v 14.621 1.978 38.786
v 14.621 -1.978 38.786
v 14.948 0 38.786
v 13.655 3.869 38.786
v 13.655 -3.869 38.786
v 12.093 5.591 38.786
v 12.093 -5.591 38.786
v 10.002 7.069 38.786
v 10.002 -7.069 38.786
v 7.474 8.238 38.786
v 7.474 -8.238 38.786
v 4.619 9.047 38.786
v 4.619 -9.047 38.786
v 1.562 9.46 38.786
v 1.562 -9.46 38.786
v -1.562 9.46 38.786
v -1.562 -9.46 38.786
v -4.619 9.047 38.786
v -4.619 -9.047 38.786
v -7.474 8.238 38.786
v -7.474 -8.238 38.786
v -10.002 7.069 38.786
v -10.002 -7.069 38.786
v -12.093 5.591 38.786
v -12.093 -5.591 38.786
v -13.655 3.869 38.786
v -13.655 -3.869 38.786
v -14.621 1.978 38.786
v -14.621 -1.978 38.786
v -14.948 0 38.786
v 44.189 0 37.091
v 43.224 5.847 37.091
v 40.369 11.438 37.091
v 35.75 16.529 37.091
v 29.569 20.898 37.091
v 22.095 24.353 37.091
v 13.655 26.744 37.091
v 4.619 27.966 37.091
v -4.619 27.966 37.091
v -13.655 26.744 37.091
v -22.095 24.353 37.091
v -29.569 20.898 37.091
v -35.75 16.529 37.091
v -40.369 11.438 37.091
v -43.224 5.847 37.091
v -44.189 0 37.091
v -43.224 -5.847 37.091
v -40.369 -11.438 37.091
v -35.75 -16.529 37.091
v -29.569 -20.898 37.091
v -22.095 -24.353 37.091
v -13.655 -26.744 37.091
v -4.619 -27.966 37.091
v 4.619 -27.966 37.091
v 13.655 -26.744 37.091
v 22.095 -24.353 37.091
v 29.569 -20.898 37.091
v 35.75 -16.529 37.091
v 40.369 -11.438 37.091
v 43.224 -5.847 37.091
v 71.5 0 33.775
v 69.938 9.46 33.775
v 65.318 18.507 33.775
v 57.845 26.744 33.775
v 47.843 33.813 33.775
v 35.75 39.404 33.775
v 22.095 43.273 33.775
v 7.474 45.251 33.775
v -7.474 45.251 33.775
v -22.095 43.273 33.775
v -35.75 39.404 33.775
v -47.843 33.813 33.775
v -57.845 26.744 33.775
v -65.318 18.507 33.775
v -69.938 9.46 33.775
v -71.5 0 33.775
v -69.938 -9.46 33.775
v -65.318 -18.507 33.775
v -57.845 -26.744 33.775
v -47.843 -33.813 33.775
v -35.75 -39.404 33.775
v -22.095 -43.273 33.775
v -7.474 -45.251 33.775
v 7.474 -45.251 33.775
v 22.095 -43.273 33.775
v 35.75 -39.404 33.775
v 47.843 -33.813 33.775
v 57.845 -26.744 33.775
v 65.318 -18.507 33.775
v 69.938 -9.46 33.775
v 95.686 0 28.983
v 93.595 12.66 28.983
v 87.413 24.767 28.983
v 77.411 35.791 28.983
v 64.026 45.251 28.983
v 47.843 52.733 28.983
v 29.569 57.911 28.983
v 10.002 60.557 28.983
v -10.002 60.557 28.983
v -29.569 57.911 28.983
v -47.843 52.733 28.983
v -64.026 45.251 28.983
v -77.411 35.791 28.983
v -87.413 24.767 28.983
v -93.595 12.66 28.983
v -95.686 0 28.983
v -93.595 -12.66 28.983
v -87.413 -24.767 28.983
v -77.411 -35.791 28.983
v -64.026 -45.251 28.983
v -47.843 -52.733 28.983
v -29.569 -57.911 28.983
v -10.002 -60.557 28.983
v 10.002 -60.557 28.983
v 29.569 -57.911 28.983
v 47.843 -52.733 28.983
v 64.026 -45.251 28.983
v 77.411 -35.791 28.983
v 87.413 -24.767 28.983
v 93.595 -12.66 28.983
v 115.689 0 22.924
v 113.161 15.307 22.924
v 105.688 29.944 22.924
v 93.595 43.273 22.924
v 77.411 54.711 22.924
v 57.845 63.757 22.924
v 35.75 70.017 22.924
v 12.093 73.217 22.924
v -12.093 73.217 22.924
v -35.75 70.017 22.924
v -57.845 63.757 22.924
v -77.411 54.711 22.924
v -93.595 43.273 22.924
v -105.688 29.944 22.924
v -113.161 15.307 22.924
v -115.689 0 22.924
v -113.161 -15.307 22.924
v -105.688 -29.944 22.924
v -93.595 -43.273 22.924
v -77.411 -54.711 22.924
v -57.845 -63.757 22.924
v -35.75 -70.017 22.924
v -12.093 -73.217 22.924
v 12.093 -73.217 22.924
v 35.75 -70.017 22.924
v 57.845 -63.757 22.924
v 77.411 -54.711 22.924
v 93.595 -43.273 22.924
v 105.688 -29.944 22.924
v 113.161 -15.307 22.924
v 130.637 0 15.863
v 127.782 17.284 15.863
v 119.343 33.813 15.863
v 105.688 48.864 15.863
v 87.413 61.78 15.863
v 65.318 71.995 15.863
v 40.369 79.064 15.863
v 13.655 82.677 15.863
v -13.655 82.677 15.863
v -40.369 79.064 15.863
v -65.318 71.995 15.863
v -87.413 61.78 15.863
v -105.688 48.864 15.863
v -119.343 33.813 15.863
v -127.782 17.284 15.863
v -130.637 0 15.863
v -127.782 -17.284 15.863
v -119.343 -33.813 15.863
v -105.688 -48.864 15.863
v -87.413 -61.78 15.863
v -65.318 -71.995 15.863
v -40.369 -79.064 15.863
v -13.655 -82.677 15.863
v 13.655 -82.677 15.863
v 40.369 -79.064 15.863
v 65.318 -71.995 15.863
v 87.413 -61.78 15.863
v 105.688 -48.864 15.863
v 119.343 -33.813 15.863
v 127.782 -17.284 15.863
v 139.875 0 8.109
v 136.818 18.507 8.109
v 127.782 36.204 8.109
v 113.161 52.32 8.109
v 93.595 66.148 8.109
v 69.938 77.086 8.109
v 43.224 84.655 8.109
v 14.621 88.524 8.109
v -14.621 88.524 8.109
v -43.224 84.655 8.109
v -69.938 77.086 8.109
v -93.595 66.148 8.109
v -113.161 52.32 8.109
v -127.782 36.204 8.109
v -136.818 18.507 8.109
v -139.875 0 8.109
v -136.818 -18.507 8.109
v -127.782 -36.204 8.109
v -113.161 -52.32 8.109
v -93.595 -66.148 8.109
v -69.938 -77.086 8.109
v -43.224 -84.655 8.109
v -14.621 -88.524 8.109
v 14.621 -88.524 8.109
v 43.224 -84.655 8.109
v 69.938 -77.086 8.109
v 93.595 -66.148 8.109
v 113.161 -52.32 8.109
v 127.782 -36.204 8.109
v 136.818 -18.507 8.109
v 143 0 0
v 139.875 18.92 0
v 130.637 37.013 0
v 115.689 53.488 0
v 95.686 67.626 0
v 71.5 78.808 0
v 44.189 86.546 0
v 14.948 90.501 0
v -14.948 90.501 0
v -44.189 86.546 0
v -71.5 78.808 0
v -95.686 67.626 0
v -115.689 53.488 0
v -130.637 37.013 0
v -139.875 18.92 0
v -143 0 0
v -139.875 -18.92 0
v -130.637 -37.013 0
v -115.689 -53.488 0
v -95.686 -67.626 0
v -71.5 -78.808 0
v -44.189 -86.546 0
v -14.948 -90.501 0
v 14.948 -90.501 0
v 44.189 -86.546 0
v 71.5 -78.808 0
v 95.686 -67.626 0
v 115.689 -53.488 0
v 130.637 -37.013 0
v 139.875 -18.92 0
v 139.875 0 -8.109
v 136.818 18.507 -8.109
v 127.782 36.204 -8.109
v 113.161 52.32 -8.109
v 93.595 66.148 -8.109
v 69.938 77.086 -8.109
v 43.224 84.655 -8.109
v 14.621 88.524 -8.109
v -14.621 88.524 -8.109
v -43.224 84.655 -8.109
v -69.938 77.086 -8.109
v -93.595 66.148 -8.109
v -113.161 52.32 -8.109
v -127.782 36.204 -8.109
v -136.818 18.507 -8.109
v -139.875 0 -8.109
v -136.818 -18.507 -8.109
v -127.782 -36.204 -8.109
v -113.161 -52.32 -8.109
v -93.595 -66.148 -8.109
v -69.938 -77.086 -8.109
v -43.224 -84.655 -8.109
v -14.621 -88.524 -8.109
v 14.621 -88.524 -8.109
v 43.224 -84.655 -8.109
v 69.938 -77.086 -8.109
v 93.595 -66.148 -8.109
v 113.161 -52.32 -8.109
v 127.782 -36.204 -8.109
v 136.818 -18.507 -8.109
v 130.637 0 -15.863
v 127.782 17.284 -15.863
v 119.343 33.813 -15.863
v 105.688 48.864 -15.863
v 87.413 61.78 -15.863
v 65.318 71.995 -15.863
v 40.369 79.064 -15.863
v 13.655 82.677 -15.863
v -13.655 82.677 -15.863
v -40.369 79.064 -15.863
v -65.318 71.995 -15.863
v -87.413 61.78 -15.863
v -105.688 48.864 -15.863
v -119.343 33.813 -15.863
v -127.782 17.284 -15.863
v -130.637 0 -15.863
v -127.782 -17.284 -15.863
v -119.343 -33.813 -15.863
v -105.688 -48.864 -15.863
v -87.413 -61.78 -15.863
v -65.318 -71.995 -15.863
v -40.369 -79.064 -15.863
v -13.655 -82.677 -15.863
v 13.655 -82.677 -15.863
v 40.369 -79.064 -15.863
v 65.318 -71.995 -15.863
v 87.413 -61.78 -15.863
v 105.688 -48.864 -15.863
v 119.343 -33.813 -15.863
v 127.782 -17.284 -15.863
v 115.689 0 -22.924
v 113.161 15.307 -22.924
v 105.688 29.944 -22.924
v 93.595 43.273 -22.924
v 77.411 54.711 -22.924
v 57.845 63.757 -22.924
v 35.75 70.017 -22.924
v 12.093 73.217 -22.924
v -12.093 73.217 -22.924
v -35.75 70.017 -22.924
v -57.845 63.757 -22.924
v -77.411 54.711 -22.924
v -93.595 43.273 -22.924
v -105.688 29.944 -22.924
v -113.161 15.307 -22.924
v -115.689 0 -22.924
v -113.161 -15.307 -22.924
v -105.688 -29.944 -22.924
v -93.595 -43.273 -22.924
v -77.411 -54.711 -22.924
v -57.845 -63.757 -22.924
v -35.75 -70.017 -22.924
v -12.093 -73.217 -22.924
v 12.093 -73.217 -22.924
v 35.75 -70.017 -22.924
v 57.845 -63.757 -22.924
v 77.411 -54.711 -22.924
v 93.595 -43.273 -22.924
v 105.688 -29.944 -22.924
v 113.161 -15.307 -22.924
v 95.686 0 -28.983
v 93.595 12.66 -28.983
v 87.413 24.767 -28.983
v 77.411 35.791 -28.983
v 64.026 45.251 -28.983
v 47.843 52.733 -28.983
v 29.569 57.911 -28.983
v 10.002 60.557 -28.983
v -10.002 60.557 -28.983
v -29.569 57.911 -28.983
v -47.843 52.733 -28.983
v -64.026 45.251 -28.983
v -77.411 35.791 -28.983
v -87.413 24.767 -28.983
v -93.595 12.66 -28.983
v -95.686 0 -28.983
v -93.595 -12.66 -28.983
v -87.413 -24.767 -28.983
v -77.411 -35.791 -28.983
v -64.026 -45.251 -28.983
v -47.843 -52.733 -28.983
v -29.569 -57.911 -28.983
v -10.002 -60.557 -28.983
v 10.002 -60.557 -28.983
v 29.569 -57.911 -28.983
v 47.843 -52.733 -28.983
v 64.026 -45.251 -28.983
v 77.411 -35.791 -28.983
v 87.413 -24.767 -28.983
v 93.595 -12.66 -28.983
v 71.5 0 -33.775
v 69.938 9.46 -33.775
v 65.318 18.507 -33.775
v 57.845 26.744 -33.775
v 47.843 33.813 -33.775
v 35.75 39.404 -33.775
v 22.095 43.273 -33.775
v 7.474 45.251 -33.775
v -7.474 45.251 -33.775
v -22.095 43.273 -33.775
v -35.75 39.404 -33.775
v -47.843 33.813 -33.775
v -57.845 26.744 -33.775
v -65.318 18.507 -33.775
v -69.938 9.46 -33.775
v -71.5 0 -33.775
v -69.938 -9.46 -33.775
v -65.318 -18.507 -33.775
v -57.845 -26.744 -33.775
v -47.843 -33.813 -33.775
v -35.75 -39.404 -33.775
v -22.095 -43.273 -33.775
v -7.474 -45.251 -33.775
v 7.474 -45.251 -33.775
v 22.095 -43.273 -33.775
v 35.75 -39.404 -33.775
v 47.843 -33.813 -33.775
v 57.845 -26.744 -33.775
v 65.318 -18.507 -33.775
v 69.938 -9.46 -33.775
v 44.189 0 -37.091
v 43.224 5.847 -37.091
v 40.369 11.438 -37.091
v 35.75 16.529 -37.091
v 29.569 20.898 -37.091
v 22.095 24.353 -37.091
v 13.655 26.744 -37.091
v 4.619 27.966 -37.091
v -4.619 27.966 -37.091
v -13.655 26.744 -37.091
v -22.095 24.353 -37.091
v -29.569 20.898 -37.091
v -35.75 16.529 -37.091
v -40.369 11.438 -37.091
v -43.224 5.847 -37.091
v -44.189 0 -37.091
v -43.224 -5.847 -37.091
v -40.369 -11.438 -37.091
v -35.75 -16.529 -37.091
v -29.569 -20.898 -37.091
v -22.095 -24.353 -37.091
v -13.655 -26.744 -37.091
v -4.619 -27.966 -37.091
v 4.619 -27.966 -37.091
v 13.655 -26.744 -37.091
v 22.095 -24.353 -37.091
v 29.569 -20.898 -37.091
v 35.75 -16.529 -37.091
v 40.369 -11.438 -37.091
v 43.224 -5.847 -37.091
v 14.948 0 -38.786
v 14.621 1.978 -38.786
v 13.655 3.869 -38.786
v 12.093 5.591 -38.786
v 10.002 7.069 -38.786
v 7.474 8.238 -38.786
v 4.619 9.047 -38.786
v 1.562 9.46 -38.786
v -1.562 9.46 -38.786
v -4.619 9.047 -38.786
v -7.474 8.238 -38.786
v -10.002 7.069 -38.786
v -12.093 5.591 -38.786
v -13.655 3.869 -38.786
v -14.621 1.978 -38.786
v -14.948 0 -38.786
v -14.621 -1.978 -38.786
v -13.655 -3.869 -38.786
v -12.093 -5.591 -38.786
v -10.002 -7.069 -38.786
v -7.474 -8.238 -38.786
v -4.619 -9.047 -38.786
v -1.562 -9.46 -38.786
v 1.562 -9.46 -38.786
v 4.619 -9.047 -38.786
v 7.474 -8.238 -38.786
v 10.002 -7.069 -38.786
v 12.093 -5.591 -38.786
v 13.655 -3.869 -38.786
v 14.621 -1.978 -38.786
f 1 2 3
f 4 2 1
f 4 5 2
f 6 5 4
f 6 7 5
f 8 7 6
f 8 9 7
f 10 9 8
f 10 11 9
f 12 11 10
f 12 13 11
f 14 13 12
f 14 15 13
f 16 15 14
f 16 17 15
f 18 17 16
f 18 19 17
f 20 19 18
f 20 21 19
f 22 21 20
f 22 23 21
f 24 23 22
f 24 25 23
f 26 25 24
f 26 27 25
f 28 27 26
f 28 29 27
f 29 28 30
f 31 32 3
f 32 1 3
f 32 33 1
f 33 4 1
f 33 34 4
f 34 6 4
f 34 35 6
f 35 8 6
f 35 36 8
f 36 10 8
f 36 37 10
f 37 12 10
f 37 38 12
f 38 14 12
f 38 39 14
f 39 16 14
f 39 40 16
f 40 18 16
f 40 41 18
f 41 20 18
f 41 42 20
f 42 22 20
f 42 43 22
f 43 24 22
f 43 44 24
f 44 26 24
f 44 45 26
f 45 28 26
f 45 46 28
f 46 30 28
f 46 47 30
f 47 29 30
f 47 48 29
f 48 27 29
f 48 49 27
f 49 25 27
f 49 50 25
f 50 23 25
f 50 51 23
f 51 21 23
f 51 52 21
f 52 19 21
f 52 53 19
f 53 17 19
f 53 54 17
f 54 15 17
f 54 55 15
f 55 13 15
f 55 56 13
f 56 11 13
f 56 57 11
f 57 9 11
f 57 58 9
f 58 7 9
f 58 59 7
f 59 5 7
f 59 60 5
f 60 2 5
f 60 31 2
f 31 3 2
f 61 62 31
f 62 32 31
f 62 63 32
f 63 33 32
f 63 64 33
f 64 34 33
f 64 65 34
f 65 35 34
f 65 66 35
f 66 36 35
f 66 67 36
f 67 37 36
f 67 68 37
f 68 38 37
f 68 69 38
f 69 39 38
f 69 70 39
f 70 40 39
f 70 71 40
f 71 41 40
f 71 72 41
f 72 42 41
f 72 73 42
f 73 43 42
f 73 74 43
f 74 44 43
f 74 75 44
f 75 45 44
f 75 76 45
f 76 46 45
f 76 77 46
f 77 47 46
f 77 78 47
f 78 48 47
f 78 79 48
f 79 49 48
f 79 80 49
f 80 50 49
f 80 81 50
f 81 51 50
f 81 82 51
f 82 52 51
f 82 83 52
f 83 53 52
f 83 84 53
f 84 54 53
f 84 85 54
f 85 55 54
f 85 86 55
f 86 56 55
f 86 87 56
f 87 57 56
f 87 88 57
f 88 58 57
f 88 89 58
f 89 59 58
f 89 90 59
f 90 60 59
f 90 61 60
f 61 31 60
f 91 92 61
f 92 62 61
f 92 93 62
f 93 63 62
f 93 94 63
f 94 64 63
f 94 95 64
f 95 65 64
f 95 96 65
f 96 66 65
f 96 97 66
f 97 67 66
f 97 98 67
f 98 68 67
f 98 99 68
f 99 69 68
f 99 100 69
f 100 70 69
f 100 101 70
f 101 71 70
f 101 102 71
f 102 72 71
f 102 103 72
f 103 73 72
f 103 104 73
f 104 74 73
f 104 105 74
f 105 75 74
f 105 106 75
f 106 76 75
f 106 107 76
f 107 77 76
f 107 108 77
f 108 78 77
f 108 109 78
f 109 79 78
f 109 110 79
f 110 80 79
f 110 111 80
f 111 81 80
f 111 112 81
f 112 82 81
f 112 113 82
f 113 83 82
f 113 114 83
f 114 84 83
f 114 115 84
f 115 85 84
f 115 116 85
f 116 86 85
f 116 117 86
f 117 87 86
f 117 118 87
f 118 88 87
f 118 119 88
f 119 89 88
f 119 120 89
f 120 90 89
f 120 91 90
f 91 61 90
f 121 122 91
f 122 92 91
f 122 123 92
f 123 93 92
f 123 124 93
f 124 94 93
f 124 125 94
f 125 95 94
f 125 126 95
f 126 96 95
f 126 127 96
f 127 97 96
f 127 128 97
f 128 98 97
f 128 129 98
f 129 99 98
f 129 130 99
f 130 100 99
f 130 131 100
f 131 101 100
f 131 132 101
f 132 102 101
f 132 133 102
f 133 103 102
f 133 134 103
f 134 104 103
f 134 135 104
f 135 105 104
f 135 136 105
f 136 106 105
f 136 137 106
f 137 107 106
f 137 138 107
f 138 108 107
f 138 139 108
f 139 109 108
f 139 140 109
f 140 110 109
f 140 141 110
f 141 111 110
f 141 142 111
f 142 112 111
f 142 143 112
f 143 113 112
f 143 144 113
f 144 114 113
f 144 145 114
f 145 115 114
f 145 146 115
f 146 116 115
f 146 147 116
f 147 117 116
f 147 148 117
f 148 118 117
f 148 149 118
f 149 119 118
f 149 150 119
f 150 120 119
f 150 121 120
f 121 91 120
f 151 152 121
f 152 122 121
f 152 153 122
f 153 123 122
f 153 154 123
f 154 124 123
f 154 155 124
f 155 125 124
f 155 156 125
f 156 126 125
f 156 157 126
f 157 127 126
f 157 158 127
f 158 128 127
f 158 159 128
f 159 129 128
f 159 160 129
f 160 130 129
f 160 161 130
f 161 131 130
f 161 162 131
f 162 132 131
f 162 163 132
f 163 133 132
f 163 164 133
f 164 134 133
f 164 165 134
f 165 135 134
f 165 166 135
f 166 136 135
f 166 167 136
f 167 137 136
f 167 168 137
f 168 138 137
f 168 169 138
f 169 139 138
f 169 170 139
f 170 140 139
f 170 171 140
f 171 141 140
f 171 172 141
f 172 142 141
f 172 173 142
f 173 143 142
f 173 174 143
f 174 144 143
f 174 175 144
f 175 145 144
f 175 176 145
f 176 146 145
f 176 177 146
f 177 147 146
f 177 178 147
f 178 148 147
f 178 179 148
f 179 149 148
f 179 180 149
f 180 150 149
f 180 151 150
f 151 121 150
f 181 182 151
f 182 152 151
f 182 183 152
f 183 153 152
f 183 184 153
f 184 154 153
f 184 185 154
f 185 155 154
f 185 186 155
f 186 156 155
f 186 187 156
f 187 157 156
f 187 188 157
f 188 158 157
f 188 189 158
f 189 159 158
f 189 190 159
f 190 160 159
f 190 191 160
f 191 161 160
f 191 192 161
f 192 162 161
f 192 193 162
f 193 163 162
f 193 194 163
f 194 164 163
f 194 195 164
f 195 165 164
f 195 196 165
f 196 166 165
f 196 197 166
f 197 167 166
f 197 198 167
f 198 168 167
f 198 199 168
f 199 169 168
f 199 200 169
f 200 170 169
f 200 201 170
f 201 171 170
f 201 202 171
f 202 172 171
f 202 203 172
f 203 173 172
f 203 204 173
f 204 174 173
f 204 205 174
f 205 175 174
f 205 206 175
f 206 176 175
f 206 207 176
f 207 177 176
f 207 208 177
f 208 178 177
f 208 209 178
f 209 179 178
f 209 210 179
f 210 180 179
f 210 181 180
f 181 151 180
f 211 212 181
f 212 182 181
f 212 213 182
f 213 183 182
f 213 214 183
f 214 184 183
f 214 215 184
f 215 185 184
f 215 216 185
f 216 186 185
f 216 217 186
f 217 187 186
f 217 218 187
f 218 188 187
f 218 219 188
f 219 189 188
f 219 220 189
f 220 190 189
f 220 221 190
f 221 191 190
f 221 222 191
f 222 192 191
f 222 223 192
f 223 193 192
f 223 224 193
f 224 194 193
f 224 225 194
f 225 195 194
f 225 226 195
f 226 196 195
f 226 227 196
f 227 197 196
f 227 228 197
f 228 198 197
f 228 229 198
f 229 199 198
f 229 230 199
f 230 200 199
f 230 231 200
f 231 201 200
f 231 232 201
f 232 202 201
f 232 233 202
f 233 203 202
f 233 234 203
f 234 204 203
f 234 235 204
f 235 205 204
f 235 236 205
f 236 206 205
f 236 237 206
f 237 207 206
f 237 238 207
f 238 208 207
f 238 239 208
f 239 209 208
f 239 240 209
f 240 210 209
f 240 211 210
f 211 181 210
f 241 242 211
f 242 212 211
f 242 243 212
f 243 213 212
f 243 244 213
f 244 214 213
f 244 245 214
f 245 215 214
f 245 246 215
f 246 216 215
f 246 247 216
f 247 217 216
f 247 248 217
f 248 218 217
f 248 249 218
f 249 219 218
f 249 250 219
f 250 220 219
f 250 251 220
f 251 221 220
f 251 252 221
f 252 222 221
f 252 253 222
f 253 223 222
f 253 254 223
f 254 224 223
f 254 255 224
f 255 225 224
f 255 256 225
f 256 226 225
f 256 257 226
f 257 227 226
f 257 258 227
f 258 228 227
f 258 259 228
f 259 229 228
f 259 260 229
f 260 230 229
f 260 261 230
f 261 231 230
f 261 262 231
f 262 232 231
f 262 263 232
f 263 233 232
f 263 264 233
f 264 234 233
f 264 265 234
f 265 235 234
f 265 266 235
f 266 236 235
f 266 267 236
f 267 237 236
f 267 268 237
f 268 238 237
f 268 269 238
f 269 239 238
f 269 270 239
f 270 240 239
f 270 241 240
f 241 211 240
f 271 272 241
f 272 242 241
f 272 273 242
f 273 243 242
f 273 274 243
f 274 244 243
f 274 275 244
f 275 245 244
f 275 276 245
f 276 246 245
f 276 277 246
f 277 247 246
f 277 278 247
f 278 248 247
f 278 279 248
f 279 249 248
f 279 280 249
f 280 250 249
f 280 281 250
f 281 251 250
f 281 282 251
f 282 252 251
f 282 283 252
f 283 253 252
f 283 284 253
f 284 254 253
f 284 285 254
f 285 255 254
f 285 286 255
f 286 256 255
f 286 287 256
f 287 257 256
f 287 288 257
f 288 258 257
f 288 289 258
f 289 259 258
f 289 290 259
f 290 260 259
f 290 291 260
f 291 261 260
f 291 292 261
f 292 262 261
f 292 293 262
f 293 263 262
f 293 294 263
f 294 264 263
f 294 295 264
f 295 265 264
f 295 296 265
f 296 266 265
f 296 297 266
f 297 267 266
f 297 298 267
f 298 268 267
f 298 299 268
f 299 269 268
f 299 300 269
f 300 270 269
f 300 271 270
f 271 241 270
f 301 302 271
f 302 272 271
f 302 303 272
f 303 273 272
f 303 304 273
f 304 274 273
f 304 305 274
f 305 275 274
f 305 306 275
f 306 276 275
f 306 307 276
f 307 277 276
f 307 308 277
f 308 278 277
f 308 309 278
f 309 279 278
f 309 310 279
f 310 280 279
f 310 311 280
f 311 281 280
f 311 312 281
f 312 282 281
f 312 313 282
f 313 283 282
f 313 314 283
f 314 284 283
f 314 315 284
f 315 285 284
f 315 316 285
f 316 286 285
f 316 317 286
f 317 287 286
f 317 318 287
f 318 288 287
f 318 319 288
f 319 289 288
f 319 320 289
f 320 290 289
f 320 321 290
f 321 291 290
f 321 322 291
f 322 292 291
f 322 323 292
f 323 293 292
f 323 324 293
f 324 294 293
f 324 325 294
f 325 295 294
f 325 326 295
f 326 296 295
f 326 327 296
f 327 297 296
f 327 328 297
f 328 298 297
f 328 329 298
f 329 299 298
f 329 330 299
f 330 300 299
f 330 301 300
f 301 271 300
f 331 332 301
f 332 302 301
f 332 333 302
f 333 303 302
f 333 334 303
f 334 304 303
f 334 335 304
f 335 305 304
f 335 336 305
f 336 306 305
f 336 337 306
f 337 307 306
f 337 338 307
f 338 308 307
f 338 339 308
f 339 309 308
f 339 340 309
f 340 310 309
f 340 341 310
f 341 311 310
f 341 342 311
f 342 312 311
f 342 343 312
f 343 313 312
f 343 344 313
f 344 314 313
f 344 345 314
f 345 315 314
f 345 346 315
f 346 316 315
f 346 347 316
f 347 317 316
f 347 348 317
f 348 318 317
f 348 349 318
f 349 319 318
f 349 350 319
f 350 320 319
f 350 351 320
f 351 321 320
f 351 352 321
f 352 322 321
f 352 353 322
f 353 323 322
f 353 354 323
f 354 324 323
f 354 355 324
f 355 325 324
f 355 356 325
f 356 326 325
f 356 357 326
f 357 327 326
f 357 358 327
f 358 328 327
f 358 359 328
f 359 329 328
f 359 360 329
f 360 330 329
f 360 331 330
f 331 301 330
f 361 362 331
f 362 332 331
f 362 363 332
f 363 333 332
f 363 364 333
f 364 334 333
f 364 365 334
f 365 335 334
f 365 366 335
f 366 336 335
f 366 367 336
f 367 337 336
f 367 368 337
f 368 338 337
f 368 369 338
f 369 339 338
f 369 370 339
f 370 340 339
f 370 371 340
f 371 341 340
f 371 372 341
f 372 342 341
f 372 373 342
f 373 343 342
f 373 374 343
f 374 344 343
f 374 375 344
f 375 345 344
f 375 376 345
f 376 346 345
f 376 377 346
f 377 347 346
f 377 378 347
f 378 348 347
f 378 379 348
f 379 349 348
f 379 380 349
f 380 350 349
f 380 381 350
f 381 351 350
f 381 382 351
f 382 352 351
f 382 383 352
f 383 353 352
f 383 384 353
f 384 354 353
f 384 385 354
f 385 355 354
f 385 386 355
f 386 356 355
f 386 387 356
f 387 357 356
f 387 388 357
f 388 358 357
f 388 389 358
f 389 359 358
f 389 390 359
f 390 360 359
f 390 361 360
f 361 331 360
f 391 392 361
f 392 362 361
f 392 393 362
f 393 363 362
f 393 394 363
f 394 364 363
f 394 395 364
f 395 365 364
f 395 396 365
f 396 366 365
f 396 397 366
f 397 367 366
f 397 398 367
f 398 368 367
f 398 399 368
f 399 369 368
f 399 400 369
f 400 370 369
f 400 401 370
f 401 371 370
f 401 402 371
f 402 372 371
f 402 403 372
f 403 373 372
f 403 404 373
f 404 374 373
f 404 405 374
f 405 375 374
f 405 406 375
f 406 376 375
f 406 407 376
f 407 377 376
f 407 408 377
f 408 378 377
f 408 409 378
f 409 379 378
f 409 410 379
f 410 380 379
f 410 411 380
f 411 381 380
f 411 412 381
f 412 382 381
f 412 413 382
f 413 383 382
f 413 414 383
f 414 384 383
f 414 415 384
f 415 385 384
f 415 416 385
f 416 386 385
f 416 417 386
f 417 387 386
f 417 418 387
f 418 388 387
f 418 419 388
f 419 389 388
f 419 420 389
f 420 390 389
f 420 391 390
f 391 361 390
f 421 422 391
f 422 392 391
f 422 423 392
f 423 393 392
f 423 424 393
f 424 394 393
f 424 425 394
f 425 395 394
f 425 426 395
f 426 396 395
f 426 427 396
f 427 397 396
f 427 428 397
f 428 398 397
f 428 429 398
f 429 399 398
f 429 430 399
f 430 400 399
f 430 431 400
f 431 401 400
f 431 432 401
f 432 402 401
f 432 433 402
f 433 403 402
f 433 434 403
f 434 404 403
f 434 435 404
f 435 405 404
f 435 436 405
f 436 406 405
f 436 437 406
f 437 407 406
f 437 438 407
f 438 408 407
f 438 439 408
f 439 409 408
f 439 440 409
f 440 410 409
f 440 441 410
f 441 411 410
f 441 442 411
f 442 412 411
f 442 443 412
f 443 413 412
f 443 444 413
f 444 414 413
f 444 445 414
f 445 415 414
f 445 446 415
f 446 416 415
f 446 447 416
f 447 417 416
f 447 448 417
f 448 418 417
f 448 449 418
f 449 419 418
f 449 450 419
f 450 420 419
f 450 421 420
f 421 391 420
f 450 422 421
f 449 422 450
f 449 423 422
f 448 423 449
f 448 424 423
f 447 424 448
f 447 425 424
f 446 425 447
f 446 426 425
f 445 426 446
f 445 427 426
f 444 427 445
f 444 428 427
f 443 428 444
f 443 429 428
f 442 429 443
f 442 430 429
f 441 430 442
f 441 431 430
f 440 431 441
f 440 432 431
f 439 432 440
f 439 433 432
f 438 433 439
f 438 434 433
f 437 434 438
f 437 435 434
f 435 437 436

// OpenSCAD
// Generated by SolidPython 1.0.1 on 2020-07-29 00:46:49


scale(v = [11, 7, 3]) {
	sphere(r = 13);
}
/***********************************************
*********      SolidPython code:      **********
************************************************
 
# import packages: SolidPython
from solid import *
from solid.utils import *
from itertools import chain, combinations, permutations


class Resize:

    def __init__(self, scad_file):
        self.scad_file = scad_file
        #self.scad_file = import_scad(scad_file)
        # cone/cylinder param:
        self.r1 = 0
        self.r2 = 0
        self.h = 0
        # rectangular prism param:
        self.w = 0
        self.l = 0
        # ellipse param:
        self.r = 0

    # import OpenScad code (file name corresponds to shape)


    # classify shape + parameters
    def assign(self, param1, param2, param3):
        if self.scad_file == 'cone.scad':
            self.r1 = param1
            self.r2 = param2
            self.h = param3
        elif self.scad_file == 'cylinder.scad':
            self.r1 = param1
            self.r2 = param2
            self.h = param3
        elif self.scad_file == 'rectangularPrism.scad':
            self.h = param1
            self.l = param2
            self.w = param3
        else:
            self.r = param1
            self.h = param2

    # resize parameters
    def iterate(self):
        x = range(3, 20, 2)
        i = 1
        if self.scad_file == 'cone.scad':
            tempList = list(permutations(x, 2))
            for temp in tempList:
                param1 = temp[0]
                param2 = temp[1]
                filepath = 'produced_scad_files/' + 'cone' + str(param1) + '_' + str(param2) + '_' + '.scad'
                scad_render_to_file(cylinder(h=param1, r1=param2, r2=0), filepath)

        elif self.scad_file == 'cylinder.scad':
            tempList = list(permutations(x, 3))
            for temp in tempList:
                param1 = temp[0]
                param2 = temp[1]
                filepath = 'produced_scad_files/' + 'cylinder' + str(param1) + '_' + str(param2) + '_' + '.scad'
                scad_render_to_file(cylinder(h=param1, r1=param2, r2=param2), filepath)

        elif self.scad_file == 'rectangularPrism.scad':
            tempList = list(permutations(x, 3))
            for temp in tempList:
                param1 = temp[0]
                param2 = temp[1]
                param3 = temp[2]
                filepath = 'produced_scad_files/' + 'rectangularPrism' + str(param1) + '_' + str(param2) + '_' + str(
                    param3) + '.scad'
                scad_render_to_file(cube(size=(param1, param2, param3)), filepath)

        elif self.scad_file == 'ellipse.scad':
            tempList = list(permutations(x, 4))
            for temp in tempList:
                param1 = temp[0]
                param2 = temp[1]
                param3 = temp[2]
                param4 = temp[3]
                filepath = 'produced_scad_files/' + 'ellipse' + str(param1) + '_' + str(param2) + '_' + str(param3) + '_' + str(param4) + '.scad'
                scad_render_to_file(scale([param1, param2, param3])(sphere(r=param4)), filepath)

    def render_to_scadfile(self):
        scad_render_to_file(scad, 'example.scad') 
 
************************************************/
